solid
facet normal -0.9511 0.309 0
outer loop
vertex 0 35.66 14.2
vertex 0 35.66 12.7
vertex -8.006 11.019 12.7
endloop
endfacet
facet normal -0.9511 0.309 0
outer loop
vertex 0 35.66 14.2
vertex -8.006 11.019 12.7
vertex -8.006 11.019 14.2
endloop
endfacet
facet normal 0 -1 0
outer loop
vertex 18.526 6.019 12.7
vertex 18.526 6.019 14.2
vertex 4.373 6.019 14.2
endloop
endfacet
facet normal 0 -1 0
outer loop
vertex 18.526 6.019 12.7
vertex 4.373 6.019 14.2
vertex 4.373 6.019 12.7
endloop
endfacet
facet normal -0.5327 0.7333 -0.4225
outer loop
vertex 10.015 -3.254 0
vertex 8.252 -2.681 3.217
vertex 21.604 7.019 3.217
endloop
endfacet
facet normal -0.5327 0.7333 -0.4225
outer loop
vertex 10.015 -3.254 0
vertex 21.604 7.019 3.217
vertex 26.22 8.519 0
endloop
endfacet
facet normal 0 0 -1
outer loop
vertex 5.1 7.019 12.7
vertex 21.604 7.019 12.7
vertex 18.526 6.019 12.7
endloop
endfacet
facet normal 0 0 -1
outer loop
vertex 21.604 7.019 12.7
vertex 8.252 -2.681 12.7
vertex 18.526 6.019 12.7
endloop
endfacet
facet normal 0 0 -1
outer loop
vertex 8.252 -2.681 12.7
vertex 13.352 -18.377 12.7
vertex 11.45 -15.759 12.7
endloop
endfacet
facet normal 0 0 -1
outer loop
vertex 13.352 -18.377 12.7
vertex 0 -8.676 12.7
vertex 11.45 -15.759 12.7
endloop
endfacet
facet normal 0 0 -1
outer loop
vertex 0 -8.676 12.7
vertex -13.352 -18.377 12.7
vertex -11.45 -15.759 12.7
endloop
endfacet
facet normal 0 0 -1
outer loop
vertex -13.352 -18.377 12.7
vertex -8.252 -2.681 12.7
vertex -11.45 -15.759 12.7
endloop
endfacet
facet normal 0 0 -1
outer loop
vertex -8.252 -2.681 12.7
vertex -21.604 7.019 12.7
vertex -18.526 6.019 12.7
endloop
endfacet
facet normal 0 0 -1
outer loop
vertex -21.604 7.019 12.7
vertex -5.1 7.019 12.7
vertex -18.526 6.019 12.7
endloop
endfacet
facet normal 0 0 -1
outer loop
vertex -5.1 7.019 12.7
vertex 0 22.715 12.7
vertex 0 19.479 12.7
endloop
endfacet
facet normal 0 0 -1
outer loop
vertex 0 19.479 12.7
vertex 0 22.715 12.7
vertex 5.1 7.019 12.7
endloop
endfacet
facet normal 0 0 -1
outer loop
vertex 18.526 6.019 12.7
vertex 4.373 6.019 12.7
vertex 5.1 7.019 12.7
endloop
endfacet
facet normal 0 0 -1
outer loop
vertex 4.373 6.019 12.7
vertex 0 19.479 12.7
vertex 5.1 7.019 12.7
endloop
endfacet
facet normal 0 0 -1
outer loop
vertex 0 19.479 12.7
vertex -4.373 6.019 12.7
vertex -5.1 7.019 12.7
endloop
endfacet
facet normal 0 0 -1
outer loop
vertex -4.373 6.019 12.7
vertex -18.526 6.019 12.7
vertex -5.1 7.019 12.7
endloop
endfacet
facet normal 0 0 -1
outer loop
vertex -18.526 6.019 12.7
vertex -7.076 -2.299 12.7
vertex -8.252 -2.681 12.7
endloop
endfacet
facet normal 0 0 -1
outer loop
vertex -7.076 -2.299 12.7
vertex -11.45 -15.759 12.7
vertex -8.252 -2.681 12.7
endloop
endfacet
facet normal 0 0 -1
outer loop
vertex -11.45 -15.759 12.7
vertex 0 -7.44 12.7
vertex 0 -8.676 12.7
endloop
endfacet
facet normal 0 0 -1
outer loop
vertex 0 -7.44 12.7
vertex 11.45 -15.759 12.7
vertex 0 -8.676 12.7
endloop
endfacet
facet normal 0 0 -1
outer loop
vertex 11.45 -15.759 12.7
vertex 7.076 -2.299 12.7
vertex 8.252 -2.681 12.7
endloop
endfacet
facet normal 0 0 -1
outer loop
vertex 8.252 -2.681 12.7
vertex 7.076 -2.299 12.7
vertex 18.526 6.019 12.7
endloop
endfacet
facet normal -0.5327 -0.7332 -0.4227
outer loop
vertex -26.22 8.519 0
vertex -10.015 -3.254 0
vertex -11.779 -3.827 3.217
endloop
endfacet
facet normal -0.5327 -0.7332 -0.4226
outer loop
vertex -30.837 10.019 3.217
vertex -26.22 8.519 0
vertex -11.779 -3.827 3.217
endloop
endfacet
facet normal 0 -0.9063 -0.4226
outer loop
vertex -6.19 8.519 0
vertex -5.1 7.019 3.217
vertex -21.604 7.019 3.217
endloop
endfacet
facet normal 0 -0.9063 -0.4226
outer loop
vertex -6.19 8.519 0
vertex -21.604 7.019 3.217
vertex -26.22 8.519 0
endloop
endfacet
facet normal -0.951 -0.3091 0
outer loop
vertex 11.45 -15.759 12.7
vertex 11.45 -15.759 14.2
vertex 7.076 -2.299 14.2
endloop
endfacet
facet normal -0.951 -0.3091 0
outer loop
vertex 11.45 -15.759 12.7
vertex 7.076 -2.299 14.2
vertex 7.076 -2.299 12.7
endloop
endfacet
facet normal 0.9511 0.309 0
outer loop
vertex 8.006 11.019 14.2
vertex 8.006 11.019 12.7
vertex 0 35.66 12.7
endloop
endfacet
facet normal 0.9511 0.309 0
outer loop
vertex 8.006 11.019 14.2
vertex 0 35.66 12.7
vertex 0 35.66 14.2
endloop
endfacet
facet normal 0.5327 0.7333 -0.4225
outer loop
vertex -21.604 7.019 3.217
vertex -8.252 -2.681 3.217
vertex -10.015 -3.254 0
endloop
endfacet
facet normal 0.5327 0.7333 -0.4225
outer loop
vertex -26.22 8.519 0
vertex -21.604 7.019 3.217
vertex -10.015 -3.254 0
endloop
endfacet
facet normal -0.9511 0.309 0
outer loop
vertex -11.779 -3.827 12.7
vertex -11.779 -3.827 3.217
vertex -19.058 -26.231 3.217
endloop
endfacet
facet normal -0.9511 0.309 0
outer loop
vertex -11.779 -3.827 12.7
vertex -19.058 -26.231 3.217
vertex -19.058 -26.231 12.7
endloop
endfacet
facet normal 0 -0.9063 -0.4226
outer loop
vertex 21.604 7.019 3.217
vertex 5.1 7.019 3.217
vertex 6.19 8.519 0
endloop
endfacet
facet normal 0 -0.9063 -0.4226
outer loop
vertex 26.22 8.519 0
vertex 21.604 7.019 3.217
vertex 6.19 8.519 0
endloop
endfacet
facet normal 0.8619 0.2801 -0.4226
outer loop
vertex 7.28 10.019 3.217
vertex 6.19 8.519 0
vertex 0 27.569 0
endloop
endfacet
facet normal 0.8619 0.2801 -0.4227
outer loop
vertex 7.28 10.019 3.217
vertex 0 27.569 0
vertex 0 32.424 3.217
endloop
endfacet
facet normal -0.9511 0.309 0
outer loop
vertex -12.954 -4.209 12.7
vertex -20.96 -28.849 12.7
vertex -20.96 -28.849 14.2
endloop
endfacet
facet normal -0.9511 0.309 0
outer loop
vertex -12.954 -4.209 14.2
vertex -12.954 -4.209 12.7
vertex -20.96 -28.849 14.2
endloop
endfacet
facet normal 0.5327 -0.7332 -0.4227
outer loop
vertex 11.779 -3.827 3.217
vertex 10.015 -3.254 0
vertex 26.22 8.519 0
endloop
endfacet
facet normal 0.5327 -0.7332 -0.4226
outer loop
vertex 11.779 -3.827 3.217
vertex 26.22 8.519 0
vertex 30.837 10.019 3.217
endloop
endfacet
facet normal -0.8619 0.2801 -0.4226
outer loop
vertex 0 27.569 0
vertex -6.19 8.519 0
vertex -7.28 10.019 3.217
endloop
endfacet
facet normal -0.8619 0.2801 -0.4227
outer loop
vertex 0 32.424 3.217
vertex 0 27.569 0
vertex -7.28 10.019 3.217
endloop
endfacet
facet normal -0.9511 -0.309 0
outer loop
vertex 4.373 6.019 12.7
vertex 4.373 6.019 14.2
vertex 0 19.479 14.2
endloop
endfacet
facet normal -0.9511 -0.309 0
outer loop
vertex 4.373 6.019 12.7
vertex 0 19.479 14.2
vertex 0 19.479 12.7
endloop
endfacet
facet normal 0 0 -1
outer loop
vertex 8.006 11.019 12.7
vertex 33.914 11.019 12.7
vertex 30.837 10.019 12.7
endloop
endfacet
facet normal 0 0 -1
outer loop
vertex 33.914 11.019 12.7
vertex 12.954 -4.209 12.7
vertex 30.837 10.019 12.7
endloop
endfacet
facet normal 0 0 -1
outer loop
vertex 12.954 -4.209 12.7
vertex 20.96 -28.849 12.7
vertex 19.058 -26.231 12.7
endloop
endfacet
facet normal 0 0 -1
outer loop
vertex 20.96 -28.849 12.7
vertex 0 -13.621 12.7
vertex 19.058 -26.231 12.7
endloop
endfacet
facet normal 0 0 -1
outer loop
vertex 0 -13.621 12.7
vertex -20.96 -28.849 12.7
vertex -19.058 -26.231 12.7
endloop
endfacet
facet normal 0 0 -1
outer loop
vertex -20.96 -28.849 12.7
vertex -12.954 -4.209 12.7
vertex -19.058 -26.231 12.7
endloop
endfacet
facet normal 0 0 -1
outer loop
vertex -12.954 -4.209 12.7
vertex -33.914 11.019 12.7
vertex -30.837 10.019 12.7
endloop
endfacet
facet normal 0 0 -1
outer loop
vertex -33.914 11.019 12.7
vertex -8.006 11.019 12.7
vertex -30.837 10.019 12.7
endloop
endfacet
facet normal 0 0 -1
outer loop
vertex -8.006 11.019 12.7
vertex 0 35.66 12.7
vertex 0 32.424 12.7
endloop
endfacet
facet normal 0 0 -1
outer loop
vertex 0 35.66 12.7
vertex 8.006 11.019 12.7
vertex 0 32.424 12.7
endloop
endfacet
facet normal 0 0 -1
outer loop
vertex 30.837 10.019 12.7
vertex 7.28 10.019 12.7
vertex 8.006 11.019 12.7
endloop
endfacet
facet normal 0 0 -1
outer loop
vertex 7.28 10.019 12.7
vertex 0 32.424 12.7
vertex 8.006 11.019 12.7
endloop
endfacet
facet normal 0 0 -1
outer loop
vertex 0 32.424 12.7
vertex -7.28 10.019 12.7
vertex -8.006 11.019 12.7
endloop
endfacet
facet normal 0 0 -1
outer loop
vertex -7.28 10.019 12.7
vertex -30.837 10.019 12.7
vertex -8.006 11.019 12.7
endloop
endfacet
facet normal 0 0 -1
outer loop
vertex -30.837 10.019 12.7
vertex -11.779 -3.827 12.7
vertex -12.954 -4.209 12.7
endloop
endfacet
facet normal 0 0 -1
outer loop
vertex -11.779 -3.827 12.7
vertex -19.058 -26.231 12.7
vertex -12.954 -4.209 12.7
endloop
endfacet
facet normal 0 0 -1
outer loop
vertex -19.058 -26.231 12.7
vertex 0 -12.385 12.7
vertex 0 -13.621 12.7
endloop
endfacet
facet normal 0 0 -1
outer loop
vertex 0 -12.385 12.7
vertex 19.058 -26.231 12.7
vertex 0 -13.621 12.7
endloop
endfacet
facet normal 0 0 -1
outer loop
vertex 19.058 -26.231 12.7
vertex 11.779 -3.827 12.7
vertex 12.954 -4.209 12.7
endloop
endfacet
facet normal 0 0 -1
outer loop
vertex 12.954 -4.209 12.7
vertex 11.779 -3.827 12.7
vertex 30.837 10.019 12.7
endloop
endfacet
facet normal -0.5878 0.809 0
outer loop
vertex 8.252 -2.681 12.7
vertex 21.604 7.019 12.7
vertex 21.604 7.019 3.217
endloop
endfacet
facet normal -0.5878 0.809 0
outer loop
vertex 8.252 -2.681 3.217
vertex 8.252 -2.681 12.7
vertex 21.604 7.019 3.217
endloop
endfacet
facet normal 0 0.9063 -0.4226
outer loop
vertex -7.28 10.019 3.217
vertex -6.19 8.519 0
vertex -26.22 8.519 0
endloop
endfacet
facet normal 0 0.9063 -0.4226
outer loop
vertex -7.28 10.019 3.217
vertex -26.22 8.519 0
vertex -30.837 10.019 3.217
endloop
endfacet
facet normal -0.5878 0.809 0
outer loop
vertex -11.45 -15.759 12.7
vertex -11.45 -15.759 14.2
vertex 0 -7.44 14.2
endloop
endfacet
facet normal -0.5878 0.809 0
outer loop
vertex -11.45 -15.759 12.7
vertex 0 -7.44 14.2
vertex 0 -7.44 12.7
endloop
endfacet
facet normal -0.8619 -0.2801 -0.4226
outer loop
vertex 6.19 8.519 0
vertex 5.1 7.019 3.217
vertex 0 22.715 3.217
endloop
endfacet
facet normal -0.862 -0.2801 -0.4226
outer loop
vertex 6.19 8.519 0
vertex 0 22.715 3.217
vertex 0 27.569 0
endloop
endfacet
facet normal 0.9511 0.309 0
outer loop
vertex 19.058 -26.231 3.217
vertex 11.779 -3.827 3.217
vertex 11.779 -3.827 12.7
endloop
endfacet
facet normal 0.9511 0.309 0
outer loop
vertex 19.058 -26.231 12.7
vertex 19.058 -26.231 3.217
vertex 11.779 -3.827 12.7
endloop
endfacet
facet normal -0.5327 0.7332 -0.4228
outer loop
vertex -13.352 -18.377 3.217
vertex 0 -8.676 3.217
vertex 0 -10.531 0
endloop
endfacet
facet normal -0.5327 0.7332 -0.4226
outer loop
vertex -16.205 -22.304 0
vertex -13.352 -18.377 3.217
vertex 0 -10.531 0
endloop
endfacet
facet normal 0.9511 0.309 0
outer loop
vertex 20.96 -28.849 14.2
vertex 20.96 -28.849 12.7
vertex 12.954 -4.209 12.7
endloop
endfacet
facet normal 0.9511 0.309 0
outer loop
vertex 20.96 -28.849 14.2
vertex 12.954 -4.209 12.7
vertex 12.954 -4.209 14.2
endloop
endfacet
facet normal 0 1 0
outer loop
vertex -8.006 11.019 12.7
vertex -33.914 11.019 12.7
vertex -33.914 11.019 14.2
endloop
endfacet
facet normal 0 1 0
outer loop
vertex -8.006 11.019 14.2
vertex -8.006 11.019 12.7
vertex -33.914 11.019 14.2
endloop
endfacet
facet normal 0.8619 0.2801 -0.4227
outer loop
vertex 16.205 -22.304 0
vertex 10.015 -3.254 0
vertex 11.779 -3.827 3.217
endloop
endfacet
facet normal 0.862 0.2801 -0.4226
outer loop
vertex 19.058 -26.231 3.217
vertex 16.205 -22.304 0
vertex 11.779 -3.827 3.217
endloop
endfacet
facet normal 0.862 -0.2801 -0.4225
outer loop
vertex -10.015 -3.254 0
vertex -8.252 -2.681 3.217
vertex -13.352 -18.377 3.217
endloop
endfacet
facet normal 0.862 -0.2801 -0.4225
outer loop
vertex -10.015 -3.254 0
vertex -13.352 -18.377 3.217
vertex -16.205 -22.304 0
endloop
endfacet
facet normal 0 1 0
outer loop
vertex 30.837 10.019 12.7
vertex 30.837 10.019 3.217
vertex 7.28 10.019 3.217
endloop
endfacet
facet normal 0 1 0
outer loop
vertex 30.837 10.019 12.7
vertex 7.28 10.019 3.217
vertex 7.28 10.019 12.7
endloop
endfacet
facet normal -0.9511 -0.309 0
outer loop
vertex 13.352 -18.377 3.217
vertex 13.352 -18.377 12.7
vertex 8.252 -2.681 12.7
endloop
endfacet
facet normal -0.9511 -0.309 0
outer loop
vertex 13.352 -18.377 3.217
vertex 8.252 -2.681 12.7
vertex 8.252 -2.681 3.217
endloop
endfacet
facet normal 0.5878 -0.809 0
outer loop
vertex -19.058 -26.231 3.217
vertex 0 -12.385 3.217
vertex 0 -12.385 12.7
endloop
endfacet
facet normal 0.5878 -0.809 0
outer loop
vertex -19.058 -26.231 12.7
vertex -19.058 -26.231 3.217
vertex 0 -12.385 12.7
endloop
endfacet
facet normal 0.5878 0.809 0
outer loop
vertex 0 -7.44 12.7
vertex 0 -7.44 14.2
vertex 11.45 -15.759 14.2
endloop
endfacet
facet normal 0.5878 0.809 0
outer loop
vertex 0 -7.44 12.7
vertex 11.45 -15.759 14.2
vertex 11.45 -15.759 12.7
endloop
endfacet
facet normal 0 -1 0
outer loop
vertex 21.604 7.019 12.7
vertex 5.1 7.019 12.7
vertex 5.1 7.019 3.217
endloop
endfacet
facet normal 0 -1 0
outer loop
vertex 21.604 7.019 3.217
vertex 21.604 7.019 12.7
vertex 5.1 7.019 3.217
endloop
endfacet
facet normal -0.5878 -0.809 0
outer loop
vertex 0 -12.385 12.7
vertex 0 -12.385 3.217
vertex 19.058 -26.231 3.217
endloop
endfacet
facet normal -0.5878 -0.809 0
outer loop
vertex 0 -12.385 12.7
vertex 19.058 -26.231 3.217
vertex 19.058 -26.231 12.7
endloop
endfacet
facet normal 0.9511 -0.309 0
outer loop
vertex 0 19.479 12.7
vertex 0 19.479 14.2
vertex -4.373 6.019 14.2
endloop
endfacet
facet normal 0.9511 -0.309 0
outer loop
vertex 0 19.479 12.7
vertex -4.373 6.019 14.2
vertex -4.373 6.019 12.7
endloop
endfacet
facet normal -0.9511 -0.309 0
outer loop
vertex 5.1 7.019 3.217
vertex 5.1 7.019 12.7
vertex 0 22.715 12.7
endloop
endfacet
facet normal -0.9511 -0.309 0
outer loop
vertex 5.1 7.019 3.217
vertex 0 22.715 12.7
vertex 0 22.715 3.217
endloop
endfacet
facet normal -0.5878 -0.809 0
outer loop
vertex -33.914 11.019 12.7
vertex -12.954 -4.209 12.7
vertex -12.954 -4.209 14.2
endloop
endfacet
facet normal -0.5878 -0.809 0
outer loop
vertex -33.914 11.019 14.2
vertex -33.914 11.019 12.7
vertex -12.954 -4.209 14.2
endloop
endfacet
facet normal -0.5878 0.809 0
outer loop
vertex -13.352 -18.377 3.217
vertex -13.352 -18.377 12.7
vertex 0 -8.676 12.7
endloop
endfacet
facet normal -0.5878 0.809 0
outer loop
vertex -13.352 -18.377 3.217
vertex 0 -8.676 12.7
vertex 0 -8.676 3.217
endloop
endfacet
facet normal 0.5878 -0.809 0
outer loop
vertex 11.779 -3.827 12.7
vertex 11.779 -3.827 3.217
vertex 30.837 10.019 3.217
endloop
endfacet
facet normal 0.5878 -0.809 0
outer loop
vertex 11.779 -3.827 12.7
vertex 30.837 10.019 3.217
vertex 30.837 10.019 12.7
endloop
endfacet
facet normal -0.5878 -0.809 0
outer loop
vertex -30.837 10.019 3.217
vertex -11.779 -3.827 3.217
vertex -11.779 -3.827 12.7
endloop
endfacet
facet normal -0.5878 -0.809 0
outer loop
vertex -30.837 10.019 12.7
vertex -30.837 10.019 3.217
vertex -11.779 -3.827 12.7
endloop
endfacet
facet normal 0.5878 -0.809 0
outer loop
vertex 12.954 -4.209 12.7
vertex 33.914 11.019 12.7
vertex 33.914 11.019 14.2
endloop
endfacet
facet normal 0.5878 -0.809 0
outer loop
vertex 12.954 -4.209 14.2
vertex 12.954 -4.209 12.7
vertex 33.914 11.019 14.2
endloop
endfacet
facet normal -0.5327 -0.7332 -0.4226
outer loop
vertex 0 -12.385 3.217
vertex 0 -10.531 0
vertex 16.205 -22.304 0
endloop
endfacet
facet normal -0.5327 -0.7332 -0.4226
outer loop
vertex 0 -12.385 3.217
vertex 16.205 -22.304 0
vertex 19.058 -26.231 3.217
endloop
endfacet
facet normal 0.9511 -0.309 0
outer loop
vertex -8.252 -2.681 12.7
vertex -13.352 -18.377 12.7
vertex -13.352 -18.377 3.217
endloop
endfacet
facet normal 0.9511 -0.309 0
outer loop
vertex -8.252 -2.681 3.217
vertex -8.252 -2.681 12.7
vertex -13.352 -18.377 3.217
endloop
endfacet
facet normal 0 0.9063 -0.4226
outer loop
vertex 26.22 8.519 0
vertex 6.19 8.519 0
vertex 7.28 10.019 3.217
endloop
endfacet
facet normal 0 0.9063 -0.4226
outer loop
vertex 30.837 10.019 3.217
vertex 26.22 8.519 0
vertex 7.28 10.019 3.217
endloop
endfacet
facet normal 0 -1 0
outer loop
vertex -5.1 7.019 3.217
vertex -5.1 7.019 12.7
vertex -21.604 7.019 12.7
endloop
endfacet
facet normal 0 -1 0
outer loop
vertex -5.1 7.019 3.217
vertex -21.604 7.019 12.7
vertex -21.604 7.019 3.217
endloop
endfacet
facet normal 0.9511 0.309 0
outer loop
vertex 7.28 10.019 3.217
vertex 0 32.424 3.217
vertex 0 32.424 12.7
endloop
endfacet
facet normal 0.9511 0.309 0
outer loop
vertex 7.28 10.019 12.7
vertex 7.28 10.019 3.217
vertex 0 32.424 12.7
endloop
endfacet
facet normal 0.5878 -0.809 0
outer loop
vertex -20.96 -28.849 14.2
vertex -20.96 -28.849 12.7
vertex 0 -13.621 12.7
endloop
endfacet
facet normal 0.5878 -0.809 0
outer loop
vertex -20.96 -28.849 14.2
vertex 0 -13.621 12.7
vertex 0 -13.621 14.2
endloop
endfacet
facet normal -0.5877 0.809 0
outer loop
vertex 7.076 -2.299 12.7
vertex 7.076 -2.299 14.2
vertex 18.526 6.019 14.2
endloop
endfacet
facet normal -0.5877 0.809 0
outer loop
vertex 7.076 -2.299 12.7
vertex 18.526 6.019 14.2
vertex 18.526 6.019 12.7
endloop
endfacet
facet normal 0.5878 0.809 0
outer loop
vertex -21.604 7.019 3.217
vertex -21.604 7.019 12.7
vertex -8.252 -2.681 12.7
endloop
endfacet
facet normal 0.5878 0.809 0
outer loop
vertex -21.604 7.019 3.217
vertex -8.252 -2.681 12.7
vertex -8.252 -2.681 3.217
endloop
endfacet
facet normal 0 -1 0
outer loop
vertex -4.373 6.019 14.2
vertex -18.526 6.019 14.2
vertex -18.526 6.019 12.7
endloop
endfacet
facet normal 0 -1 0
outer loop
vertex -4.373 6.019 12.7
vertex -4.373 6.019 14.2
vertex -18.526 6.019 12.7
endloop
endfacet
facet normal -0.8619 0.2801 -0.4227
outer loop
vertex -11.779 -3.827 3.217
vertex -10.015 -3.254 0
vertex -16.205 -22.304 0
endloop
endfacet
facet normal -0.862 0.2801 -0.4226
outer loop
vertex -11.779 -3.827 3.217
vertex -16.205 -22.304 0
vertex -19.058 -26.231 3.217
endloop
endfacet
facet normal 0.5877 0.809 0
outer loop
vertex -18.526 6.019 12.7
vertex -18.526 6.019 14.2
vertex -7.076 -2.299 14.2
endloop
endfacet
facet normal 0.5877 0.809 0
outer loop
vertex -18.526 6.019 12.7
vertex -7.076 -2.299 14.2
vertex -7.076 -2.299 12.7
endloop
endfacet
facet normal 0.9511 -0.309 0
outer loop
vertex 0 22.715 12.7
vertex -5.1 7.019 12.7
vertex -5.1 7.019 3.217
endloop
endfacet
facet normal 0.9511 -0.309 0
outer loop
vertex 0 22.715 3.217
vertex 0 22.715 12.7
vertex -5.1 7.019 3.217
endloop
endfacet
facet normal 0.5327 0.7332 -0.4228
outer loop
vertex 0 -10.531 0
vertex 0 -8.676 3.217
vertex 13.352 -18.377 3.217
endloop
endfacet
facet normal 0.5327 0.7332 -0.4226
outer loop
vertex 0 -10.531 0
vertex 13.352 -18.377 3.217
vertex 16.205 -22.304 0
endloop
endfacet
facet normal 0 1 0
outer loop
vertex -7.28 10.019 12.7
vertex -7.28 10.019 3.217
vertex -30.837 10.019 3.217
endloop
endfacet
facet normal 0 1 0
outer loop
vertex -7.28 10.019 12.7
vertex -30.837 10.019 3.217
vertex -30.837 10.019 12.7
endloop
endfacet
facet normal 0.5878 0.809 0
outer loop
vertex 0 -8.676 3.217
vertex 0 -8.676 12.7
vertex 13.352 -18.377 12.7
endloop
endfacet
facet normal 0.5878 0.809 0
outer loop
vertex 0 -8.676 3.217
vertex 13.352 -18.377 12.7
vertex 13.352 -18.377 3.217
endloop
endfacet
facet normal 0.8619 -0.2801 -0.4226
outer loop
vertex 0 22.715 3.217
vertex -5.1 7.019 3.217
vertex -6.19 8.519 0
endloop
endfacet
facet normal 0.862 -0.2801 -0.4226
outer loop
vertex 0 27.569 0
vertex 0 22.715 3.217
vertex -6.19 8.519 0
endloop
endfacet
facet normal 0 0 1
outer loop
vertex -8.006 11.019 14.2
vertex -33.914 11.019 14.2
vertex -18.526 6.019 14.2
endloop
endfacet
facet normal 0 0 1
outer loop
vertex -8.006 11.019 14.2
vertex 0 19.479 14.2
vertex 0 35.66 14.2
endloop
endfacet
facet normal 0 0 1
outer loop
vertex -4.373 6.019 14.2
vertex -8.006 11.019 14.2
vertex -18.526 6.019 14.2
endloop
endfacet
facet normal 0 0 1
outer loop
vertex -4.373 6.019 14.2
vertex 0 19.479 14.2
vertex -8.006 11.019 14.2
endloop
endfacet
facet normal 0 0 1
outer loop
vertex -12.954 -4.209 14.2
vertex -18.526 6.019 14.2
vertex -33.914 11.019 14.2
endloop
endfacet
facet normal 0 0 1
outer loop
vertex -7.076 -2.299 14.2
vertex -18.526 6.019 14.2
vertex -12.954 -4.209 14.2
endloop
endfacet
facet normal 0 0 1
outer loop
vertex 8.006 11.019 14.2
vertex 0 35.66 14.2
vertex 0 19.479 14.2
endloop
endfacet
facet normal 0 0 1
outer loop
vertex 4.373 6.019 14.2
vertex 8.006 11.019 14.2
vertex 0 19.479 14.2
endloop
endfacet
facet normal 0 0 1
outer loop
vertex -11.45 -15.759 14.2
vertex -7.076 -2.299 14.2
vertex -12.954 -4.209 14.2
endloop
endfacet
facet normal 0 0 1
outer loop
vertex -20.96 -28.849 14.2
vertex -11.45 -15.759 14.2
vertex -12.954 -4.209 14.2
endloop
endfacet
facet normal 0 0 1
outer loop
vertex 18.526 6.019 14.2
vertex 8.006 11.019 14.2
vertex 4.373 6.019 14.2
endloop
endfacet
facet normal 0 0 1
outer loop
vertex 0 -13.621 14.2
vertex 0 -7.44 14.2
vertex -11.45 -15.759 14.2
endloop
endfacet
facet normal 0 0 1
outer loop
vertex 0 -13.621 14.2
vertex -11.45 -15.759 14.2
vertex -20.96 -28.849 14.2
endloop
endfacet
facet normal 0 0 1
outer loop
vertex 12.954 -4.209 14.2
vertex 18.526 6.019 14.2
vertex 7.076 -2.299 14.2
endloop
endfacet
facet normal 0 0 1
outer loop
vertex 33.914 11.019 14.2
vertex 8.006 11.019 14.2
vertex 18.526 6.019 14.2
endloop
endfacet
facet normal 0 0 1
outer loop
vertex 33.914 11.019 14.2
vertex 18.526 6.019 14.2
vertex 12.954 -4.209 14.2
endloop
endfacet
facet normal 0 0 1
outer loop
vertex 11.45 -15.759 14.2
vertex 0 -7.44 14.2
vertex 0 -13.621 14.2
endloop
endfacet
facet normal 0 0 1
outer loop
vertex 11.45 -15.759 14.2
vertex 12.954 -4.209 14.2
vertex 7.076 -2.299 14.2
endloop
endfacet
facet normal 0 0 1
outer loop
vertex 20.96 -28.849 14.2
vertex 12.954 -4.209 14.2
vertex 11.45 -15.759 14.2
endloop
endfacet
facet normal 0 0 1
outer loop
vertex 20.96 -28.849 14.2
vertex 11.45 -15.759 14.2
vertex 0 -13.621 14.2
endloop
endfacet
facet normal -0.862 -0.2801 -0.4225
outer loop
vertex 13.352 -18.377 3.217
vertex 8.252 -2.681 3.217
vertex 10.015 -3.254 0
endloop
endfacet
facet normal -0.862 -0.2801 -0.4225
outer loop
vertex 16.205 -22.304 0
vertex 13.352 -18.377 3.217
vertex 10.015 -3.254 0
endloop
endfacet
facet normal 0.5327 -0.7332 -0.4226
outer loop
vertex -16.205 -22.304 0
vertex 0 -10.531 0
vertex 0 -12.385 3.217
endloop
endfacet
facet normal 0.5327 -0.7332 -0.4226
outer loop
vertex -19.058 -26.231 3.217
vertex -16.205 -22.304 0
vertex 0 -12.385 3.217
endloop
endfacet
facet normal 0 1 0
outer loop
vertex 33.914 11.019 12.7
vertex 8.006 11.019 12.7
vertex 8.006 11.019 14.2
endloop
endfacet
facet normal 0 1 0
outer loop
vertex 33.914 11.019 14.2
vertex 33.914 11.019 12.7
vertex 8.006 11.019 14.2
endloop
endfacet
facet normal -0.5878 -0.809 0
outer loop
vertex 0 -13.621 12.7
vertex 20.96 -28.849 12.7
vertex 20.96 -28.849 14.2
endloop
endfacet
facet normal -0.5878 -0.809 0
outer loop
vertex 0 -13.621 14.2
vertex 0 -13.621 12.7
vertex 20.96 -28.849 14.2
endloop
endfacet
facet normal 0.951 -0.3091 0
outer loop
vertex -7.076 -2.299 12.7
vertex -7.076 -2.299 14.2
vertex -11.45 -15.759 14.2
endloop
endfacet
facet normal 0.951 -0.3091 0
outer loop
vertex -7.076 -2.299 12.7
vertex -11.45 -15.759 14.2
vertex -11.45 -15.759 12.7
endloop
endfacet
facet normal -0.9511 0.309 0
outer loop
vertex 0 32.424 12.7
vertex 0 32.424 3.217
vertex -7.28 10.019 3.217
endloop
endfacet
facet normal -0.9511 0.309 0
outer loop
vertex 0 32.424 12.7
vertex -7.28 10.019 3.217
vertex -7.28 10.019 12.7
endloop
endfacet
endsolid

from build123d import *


with BuildPart() as f3:
    # F3: sweep along a path in F0
    with BuildLine(Plane.XY) as f3_path:
        Line((6.1897202132, 8.5194189943), (26.220075585, 8.5194189943))
        Line((26.220075585, 8.5194189943), (10.0151776859, -3.2541284914))
        Line((10.0151776859, -3.2541284914), (16.2048978991, -22.3041284914))
        Line((16.2048978991, -22.3041284914), (0, -10.5305810057))
        Line((0, -10.5305810057), (-16.2048978991, -22.3041284914))
        Line((-16.2048978991, -22.3041284914), (-10.0151776859, -3.2541284914))
        Line((-10.0151776859, -3.2541284914), (-26.220075585, 8.5194189943))
        Line((-26.220075585, 8.5194189943), (-6.1897202132, 8.5194189943))
        Line((-6.1897202132, 8.5194189943), (0, 27.5694189943))
        Line((0, 27.5694189943), (6.1897202132, 8.5194189943))
    # F2 (on plane+point) → F3 (sweep)
    with BuildSketch(Plane.YZ.offset(6.1897202132)):
        Polygon((7.0194189943, 3.2167603808), (8.5194189943, 0), (10.0194189943, 3.2167603808), (10.0194189943, 12.7), (11.0194189943, 12.7), (11.0194189943, 14.2), (8.5194189943, 14.2), (6.0194189943, 14.2), (6.0194189943, 12.7), (7.0194189943, 12.7), align=None)
    sweep(path=f3_path.line, transition=Transition.RIGHT)


solid = f3.part
